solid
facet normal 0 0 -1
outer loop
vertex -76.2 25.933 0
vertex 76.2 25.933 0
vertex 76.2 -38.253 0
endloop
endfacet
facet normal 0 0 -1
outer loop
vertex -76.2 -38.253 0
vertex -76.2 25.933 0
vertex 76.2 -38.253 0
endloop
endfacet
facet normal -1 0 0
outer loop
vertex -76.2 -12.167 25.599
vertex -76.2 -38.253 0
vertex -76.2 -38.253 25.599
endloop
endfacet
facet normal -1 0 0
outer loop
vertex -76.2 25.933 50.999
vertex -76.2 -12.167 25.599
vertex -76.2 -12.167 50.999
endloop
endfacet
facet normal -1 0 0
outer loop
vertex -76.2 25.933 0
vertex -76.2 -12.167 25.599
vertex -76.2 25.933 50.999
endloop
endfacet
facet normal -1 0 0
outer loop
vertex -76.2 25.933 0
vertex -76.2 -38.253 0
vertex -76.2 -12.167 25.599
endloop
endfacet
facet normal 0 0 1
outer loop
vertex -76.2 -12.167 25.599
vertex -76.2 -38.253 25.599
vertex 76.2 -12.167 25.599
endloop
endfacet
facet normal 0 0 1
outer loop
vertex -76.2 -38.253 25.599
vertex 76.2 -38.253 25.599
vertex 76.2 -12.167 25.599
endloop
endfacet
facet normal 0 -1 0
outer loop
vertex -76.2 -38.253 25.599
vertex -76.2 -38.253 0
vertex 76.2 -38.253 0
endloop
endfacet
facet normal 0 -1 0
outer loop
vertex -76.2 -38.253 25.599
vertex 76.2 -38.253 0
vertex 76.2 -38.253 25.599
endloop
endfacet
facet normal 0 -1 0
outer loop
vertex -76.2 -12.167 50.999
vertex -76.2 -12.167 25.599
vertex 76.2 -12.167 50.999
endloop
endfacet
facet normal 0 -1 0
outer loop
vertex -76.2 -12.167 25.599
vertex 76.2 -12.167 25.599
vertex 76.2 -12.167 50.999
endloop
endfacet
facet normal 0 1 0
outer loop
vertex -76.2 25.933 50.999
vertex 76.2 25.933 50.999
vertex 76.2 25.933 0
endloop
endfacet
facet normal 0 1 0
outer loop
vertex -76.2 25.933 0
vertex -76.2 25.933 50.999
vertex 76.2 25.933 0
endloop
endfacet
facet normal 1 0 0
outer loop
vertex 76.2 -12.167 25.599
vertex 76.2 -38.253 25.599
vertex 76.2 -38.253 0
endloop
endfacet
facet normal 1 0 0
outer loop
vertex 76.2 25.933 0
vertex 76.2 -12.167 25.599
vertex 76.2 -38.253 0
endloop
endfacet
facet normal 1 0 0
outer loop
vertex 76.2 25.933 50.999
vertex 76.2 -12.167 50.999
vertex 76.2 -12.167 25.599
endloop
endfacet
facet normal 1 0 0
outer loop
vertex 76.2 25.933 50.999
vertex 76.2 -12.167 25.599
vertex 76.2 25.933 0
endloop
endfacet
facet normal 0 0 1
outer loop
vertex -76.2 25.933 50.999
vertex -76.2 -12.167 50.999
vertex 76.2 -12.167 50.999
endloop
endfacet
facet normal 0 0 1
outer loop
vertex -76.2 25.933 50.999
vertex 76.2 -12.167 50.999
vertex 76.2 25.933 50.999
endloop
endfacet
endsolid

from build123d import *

# Parameters (mm, degrees)
F1_DEPTH = 76.2
F2_DEPTH = 76.2


with BuildPart() as f1:
    # F0 (on Right) → F1 (new body)
    with BuildSketch(Plane.YZ):
        Polygon((-38.252957, 0), (0, 0), (25.933029, 0), (25.933029, 50.999308), (-12.166971, 50.999308), (-12.166971, 25.599308), (-38.252957, 25.599308), align=None)
    extrude(amount=F1_DEPTH)

    # F1_face (on face) → F2 (join)
    with BuildSketch(Plane(origin=(0, -1.325449, 22.251354), x_dir=(0, 1, 0), z_dir=(-1, 0, 0))):
        Polygon((-36.927508, 22.251354), (-36.927508, -3.347954), (-10.841522, -3.347954), (-10.841522, -28.747954), (27.258478, -28.747954), (27.258478, 22.251354), align=None)
    extrude(amount=F2_DEPTH)


solid = f1.part
